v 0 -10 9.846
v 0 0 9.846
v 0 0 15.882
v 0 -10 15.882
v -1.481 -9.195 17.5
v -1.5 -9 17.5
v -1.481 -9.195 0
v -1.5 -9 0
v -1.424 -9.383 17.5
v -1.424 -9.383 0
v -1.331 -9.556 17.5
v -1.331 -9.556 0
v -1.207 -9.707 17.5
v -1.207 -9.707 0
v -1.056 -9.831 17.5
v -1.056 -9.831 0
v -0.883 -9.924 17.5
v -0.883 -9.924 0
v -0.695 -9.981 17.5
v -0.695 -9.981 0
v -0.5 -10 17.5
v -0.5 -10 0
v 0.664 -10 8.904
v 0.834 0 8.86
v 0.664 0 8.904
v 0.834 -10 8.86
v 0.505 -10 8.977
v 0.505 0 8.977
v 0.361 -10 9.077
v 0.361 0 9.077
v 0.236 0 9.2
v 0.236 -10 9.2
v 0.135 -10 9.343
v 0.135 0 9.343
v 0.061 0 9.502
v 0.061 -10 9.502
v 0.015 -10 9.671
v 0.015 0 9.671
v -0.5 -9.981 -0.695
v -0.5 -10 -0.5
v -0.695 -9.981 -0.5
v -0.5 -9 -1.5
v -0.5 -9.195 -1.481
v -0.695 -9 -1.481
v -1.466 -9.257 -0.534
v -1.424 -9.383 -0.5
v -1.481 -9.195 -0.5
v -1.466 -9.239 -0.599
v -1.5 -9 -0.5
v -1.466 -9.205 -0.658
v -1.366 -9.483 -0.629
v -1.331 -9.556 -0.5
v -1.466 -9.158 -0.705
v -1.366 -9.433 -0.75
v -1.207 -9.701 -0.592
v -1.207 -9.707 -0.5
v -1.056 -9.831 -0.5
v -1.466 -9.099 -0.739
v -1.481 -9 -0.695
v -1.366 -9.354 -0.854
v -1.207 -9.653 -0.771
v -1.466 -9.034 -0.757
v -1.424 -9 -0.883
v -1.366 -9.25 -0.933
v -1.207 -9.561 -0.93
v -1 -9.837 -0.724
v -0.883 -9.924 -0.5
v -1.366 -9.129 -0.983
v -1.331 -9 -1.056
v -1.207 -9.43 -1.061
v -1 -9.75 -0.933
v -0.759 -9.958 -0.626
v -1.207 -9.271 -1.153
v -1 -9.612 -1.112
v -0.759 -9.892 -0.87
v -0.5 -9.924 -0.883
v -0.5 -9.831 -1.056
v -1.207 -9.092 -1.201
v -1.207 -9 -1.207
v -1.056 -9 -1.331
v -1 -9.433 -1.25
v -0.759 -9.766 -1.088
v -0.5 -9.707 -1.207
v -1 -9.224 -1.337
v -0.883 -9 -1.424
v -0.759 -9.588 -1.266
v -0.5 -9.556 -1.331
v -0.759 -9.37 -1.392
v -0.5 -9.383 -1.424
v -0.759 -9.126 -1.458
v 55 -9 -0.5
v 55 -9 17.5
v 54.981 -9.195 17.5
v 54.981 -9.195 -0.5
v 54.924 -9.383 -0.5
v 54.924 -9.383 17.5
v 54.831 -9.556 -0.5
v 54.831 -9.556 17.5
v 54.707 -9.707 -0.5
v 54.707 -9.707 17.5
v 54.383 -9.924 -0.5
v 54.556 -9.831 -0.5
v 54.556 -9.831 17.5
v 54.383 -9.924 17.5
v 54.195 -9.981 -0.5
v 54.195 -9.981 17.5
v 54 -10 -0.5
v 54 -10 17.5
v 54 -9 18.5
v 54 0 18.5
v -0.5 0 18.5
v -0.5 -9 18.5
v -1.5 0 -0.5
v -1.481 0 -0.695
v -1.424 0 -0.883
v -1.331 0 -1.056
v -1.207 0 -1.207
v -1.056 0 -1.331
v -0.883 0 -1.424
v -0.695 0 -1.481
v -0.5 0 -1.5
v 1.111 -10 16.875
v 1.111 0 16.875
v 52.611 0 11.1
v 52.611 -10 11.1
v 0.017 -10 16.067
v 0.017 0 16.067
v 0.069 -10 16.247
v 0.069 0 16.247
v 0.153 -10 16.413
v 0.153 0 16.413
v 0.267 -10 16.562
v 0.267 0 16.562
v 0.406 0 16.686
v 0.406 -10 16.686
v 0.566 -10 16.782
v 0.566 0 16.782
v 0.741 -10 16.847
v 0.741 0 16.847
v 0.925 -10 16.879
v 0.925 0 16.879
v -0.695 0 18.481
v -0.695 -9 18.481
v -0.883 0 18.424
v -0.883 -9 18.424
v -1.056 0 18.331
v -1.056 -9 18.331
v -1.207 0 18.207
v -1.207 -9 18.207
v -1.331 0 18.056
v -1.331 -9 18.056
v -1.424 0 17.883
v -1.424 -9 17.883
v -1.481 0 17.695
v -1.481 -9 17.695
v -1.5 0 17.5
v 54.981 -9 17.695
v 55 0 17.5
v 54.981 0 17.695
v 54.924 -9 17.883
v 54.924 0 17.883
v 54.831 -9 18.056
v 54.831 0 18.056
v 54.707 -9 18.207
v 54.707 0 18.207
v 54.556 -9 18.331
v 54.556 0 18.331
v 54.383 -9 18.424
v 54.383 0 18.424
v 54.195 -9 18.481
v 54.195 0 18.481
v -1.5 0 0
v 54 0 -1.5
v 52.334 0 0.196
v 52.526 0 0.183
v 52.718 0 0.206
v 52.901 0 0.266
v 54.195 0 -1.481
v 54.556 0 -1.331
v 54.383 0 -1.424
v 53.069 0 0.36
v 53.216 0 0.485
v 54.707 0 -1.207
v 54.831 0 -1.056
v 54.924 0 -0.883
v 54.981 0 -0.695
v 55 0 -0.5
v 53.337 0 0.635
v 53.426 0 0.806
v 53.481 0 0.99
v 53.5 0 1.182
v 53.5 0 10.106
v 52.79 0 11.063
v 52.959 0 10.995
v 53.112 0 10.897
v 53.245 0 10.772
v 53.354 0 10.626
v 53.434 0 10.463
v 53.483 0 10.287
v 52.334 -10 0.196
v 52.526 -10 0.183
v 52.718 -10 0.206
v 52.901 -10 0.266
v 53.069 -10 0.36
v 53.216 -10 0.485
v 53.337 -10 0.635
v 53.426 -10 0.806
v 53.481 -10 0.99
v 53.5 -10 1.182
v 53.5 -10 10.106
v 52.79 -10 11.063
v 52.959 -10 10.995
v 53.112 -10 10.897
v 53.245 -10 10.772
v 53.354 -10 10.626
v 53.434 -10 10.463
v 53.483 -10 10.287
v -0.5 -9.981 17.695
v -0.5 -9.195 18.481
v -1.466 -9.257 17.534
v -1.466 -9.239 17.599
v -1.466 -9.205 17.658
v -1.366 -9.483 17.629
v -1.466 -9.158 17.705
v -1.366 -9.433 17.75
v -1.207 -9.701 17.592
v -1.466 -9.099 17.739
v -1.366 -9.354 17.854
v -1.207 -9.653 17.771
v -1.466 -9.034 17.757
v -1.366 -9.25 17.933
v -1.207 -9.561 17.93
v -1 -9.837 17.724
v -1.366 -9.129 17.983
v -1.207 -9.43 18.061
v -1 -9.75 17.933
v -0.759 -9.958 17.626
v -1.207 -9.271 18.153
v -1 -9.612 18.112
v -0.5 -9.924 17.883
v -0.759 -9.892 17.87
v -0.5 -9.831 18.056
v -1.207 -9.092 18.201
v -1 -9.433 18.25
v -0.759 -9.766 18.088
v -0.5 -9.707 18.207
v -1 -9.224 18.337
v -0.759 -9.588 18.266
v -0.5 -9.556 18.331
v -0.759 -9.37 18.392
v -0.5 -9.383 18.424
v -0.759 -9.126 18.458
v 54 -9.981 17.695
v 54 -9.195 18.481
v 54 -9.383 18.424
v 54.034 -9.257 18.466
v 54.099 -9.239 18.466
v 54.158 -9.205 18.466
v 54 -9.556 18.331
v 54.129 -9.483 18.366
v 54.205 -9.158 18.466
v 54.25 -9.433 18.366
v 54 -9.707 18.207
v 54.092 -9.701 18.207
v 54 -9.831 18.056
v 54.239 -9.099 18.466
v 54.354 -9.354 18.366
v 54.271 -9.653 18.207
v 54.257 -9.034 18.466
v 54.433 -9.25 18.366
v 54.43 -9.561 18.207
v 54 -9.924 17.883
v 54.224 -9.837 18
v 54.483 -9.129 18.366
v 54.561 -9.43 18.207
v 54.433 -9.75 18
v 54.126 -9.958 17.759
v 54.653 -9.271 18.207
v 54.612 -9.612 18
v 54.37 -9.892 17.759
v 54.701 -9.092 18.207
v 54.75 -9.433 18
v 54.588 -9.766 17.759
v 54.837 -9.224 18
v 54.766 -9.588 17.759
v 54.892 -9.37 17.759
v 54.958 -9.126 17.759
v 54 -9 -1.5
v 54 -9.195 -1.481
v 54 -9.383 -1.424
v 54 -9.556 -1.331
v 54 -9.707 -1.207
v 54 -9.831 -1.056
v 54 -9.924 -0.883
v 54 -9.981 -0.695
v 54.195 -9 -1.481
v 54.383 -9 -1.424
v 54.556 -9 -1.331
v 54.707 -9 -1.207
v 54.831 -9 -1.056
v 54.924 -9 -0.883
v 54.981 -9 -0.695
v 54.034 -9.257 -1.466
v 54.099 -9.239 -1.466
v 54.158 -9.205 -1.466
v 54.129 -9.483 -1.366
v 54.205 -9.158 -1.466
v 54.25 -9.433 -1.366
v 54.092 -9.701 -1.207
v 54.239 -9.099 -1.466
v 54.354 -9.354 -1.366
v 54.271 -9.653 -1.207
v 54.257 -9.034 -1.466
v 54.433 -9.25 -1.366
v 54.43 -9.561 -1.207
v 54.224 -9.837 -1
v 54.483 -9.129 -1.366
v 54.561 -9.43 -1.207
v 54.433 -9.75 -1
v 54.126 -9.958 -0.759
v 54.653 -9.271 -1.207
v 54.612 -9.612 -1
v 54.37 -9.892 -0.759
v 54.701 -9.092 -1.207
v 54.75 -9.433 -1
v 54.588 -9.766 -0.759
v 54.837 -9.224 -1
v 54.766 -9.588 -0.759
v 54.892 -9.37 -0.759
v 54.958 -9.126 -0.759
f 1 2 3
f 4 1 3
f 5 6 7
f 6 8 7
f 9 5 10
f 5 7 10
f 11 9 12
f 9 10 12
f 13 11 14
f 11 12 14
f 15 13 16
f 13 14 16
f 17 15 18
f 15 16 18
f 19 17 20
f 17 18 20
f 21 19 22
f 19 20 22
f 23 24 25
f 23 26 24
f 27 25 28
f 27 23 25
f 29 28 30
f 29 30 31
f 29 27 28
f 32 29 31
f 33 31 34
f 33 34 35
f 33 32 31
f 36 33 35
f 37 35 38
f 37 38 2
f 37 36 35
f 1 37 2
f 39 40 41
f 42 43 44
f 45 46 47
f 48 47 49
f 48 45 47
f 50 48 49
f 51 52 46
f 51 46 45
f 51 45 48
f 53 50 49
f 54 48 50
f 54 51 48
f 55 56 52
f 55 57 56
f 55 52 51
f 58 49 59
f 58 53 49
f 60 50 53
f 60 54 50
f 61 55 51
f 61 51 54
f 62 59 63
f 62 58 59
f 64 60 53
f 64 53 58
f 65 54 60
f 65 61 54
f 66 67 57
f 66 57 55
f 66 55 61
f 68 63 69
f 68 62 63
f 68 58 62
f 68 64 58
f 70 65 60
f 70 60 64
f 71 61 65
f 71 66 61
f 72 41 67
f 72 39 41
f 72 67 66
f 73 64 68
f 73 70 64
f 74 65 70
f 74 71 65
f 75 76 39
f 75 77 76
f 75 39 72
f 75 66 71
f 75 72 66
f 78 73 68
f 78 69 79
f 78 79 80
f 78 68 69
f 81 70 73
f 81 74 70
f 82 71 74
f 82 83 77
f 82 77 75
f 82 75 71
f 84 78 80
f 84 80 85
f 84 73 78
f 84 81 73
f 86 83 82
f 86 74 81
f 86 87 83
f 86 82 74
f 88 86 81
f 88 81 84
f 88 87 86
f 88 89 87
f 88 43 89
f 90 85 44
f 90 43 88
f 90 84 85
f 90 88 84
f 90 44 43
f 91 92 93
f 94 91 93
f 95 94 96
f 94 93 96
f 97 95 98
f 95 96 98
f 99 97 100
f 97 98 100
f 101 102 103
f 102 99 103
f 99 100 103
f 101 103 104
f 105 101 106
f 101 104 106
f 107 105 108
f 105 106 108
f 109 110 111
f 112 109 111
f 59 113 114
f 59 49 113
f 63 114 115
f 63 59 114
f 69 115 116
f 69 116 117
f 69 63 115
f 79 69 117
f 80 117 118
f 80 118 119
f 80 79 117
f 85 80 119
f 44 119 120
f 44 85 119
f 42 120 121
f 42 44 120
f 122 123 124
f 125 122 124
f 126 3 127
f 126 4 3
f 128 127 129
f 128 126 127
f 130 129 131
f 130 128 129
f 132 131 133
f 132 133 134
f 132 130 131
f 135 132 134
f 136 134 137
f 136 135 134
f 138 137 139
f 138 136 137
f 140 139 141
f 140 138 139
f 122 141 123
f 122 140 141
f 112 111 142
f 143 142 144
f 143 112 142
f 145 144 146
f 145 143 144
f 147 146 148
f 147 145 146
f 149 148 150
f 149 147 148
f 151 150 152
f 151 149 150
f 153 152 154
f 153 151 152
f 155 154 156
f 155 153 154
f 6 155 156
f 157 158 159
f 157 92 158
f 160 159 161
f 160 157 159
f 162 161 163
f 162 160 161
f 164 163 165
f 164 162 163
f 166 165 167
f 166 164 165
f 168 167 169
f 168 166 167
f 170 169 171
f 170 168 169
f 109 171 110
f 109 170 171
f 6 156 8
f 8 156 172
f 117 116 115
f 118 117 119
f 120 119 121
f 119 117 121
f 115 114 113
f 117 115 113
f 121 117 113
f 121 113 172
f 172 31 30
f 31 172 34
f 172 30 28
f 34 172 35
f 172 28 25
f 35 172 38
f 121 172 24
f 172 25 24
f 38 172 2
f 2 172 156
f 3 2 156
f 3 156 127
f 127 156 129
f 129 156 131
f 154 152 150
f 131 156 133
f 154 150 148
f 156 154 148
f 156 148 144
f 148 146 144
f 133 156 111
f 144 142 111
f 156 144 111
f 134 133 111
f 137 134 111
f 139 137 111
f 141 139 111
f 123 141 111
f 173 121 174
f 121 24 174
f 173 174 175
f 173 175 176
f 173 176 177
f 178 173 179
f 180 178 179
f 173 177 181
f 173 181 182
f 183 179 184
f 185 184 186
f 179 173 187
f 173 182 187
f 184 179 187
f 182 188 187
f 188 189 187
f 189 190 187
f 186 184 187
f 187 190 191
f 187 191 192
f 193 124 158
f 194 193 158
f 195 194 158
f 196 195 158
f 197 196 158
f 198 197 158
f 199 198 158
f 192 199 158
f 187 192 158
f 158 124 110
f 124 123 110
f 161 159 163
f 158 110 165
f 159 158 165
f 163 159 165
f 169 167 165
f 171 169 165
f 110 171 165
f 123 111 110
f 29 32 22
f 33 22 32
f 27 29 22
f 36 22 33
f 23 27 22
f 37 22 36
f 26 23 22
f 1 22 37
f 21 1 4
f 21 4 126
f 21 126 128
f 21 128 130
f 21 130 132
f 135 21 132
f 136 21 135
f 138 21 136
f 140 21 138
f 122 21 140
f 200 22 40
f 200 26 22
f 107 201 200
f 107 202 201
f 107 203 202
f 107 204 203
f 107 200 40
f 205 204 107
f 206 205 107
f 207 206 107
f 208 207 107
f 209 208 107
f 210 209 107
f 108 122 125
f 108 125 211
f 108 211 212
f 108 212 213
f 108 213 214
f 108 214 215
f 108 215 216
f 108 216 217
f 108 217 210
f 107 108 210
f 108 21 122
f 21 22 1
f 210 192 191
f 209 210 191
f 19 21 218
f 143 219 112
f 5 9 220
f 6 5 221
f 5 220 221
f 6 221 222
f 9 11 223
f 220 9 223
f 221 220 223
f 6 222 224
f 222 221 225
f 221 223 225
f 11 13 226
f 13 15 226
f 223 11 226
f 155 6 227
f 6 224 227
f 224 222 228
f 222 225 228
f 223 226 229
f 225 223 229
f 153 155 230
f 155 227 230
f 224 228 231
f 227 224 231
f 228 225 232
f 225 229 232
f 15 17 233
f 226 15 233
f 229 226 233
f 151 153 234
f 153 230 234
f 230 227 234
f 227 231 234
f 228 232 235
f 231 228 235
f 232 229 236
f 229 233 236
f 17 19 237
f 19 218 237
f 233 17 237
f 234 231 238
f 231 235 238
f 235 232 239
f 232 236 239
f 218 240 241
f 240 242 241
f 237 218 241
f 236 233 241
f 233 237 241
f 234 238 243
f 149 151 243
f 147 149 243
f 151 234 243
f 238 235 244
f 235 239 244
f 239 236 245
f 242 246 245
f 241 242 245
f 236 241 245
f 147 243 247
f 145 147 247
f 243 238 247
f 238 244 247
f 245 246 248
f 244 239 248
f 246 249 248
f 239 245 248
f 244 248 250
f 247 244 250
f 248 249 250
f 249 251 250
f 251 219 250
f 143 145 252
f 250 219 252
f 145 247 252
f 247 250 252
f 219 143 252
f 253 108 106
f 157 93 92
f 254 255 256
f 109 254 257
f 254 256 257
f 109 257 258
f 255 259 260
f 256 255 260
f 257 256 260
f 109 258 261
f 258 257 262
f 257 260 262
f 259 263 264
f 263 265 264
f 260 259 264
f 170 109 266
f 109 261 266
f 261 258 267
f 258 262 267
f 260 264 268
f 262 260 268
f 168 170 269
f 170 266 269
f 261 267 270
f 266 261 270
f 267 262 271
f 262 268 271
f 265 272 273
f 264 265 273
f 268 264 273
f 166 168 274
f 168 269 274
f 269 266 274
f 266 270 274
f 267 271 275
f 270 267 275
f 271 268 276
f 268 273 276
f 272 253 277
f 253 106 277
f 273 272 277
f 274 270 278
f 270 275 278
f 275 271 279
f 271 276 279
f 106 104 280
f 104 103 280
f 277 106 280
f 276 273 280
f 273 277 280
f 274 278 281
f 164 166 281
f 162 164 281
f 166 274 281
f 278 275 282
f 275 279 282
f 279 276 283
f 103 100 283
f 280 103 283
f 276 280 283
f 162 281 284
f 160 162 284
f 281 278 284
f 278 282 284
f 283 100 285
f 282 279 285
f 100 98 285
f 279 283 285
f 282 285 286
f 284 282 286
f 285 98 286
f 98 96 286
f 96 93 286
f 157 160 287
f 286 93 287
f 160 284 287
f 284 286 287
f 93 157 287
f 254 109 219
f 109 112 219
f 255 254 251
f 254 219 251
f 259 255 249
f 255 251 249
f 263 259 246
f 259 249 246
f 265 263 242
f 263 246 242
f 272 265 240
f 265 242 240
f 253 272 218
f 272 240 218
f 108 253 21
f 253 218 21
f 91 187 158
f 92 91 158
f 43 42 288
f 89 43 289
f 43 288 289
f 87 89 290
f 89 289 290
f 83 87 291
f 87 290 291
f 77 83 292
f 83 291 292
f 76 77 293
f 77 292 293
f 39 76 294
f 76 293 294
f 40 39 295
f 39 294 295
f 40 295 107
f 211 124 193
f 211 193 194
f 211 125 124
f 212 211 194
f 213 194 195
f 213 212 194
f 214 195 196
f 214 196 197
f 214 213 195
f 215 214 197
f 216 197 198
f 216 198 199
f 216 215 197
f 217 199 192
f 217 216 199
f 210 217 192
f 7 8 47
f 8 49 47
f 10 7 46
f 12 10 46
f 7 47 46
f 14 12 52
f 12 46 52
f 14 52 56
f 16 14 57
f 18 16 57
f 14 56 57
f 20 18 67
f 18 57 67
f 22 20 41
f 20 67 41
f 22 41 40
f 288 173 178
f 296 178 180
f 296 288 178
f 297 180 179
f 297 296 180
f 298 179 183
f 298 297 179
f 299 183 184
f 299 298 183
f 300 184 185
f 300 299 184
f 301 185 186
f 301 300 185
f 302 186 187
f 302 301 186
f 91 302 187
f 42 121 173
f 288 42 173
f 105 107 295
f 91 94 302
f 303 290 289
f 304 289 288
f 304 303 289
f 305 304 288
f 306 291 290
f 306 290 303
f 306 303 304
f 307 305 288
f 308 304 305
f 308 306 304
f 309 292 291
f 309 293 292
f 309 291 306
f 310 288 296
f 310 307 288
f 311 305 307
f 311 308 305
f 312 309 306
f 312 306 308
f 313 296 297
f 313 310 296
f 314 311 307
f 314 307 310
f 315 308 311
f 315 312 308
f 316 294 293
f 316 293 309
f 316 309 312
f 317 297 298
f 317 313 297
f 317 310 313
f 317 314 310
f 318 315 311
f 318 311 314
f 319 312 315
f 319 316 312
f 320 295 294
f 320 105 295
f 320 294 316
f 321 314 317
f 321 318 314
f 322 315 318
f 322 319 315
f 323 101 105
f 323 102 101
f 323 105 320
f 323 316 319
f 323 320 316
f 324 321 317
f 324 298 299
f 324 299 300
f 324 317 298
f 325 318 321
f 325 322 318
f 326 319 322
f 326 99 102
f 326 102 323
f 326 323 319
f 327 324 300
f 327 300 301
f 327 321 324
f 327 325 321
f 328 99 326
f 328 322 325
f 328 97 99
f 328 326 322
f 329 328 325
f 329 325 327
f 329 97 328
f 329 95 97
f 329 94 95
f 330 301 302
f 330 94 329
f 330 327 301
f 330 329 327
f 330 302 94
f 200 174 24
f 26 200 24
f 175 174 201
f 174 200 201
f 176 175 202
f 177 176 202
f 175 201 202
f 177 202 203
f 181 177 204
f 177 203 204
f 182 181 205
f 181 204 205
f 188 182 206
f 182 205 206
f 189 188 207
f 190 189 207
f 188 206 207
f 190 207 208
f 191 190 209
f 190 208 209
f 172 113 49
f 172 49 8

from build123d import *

# Parameters (mm, degrees)
F0_W     = 53.5
F0_H     = 1.5
F0_W_2   = 1.5
F1_DEPTH = 10
F2_R     = 1
F3_R     = 1


with BuildPart() as f1:
    # F0 (on Front) → F1 (new body)
    with BuildSketch(Plane.XZ):
        with Locations((26.75, -0.75)):
            Rectangle(F0_W, F0_H)
        Polygon((0, 9), (0, 0), (53.5, 0), align=None)
        with Locations((-0.75, -0.75)):
            Rectangle(F0_W_2, F0_H)
        Polygon((53.5, 11), (53.5, 0), (53.5, -1.5), (54.999999, -1.5), (54.999999, 18.5), (53.5, 18.5), align=None)
        Polygon((-1.5, 0), (0, 0), (0, 9), (0, 17), (53.5, 11), (53.5, 18.5), (-1.500001, 18.5), align=None)
    extrude(amount=F1_DEPTH)

    # F2
    f2_edges = [f1.edges().sort_by_distance(p)[0] for p in [
        (54.999999, -10, 8.5),
        (26.749999, -10, 18.5),
        (26.75, -10, -1.5),
        (-1.5, -10, 9.25),
        (-1.5, -10, -0.75),
        (-1.5, -5, -1.5),
        (-1.500001, -5, 18.5),
        (54.999999, -5, 18.5),
        (54.999999, -5, -1.5),
    ]]
    fillet(f2_edges, radius=F2_R)

    # F3
    f3_edges = [f1.edges().sort_by_distance(p)[0] for p in [
        (0, -5, 17),
        (0, -5, 9),
        (53.5, -5, 11),
        (53.5, -5, 0),
    ]]
    fillet(f3_edges, radius=F3_R)


solid = f1.part
